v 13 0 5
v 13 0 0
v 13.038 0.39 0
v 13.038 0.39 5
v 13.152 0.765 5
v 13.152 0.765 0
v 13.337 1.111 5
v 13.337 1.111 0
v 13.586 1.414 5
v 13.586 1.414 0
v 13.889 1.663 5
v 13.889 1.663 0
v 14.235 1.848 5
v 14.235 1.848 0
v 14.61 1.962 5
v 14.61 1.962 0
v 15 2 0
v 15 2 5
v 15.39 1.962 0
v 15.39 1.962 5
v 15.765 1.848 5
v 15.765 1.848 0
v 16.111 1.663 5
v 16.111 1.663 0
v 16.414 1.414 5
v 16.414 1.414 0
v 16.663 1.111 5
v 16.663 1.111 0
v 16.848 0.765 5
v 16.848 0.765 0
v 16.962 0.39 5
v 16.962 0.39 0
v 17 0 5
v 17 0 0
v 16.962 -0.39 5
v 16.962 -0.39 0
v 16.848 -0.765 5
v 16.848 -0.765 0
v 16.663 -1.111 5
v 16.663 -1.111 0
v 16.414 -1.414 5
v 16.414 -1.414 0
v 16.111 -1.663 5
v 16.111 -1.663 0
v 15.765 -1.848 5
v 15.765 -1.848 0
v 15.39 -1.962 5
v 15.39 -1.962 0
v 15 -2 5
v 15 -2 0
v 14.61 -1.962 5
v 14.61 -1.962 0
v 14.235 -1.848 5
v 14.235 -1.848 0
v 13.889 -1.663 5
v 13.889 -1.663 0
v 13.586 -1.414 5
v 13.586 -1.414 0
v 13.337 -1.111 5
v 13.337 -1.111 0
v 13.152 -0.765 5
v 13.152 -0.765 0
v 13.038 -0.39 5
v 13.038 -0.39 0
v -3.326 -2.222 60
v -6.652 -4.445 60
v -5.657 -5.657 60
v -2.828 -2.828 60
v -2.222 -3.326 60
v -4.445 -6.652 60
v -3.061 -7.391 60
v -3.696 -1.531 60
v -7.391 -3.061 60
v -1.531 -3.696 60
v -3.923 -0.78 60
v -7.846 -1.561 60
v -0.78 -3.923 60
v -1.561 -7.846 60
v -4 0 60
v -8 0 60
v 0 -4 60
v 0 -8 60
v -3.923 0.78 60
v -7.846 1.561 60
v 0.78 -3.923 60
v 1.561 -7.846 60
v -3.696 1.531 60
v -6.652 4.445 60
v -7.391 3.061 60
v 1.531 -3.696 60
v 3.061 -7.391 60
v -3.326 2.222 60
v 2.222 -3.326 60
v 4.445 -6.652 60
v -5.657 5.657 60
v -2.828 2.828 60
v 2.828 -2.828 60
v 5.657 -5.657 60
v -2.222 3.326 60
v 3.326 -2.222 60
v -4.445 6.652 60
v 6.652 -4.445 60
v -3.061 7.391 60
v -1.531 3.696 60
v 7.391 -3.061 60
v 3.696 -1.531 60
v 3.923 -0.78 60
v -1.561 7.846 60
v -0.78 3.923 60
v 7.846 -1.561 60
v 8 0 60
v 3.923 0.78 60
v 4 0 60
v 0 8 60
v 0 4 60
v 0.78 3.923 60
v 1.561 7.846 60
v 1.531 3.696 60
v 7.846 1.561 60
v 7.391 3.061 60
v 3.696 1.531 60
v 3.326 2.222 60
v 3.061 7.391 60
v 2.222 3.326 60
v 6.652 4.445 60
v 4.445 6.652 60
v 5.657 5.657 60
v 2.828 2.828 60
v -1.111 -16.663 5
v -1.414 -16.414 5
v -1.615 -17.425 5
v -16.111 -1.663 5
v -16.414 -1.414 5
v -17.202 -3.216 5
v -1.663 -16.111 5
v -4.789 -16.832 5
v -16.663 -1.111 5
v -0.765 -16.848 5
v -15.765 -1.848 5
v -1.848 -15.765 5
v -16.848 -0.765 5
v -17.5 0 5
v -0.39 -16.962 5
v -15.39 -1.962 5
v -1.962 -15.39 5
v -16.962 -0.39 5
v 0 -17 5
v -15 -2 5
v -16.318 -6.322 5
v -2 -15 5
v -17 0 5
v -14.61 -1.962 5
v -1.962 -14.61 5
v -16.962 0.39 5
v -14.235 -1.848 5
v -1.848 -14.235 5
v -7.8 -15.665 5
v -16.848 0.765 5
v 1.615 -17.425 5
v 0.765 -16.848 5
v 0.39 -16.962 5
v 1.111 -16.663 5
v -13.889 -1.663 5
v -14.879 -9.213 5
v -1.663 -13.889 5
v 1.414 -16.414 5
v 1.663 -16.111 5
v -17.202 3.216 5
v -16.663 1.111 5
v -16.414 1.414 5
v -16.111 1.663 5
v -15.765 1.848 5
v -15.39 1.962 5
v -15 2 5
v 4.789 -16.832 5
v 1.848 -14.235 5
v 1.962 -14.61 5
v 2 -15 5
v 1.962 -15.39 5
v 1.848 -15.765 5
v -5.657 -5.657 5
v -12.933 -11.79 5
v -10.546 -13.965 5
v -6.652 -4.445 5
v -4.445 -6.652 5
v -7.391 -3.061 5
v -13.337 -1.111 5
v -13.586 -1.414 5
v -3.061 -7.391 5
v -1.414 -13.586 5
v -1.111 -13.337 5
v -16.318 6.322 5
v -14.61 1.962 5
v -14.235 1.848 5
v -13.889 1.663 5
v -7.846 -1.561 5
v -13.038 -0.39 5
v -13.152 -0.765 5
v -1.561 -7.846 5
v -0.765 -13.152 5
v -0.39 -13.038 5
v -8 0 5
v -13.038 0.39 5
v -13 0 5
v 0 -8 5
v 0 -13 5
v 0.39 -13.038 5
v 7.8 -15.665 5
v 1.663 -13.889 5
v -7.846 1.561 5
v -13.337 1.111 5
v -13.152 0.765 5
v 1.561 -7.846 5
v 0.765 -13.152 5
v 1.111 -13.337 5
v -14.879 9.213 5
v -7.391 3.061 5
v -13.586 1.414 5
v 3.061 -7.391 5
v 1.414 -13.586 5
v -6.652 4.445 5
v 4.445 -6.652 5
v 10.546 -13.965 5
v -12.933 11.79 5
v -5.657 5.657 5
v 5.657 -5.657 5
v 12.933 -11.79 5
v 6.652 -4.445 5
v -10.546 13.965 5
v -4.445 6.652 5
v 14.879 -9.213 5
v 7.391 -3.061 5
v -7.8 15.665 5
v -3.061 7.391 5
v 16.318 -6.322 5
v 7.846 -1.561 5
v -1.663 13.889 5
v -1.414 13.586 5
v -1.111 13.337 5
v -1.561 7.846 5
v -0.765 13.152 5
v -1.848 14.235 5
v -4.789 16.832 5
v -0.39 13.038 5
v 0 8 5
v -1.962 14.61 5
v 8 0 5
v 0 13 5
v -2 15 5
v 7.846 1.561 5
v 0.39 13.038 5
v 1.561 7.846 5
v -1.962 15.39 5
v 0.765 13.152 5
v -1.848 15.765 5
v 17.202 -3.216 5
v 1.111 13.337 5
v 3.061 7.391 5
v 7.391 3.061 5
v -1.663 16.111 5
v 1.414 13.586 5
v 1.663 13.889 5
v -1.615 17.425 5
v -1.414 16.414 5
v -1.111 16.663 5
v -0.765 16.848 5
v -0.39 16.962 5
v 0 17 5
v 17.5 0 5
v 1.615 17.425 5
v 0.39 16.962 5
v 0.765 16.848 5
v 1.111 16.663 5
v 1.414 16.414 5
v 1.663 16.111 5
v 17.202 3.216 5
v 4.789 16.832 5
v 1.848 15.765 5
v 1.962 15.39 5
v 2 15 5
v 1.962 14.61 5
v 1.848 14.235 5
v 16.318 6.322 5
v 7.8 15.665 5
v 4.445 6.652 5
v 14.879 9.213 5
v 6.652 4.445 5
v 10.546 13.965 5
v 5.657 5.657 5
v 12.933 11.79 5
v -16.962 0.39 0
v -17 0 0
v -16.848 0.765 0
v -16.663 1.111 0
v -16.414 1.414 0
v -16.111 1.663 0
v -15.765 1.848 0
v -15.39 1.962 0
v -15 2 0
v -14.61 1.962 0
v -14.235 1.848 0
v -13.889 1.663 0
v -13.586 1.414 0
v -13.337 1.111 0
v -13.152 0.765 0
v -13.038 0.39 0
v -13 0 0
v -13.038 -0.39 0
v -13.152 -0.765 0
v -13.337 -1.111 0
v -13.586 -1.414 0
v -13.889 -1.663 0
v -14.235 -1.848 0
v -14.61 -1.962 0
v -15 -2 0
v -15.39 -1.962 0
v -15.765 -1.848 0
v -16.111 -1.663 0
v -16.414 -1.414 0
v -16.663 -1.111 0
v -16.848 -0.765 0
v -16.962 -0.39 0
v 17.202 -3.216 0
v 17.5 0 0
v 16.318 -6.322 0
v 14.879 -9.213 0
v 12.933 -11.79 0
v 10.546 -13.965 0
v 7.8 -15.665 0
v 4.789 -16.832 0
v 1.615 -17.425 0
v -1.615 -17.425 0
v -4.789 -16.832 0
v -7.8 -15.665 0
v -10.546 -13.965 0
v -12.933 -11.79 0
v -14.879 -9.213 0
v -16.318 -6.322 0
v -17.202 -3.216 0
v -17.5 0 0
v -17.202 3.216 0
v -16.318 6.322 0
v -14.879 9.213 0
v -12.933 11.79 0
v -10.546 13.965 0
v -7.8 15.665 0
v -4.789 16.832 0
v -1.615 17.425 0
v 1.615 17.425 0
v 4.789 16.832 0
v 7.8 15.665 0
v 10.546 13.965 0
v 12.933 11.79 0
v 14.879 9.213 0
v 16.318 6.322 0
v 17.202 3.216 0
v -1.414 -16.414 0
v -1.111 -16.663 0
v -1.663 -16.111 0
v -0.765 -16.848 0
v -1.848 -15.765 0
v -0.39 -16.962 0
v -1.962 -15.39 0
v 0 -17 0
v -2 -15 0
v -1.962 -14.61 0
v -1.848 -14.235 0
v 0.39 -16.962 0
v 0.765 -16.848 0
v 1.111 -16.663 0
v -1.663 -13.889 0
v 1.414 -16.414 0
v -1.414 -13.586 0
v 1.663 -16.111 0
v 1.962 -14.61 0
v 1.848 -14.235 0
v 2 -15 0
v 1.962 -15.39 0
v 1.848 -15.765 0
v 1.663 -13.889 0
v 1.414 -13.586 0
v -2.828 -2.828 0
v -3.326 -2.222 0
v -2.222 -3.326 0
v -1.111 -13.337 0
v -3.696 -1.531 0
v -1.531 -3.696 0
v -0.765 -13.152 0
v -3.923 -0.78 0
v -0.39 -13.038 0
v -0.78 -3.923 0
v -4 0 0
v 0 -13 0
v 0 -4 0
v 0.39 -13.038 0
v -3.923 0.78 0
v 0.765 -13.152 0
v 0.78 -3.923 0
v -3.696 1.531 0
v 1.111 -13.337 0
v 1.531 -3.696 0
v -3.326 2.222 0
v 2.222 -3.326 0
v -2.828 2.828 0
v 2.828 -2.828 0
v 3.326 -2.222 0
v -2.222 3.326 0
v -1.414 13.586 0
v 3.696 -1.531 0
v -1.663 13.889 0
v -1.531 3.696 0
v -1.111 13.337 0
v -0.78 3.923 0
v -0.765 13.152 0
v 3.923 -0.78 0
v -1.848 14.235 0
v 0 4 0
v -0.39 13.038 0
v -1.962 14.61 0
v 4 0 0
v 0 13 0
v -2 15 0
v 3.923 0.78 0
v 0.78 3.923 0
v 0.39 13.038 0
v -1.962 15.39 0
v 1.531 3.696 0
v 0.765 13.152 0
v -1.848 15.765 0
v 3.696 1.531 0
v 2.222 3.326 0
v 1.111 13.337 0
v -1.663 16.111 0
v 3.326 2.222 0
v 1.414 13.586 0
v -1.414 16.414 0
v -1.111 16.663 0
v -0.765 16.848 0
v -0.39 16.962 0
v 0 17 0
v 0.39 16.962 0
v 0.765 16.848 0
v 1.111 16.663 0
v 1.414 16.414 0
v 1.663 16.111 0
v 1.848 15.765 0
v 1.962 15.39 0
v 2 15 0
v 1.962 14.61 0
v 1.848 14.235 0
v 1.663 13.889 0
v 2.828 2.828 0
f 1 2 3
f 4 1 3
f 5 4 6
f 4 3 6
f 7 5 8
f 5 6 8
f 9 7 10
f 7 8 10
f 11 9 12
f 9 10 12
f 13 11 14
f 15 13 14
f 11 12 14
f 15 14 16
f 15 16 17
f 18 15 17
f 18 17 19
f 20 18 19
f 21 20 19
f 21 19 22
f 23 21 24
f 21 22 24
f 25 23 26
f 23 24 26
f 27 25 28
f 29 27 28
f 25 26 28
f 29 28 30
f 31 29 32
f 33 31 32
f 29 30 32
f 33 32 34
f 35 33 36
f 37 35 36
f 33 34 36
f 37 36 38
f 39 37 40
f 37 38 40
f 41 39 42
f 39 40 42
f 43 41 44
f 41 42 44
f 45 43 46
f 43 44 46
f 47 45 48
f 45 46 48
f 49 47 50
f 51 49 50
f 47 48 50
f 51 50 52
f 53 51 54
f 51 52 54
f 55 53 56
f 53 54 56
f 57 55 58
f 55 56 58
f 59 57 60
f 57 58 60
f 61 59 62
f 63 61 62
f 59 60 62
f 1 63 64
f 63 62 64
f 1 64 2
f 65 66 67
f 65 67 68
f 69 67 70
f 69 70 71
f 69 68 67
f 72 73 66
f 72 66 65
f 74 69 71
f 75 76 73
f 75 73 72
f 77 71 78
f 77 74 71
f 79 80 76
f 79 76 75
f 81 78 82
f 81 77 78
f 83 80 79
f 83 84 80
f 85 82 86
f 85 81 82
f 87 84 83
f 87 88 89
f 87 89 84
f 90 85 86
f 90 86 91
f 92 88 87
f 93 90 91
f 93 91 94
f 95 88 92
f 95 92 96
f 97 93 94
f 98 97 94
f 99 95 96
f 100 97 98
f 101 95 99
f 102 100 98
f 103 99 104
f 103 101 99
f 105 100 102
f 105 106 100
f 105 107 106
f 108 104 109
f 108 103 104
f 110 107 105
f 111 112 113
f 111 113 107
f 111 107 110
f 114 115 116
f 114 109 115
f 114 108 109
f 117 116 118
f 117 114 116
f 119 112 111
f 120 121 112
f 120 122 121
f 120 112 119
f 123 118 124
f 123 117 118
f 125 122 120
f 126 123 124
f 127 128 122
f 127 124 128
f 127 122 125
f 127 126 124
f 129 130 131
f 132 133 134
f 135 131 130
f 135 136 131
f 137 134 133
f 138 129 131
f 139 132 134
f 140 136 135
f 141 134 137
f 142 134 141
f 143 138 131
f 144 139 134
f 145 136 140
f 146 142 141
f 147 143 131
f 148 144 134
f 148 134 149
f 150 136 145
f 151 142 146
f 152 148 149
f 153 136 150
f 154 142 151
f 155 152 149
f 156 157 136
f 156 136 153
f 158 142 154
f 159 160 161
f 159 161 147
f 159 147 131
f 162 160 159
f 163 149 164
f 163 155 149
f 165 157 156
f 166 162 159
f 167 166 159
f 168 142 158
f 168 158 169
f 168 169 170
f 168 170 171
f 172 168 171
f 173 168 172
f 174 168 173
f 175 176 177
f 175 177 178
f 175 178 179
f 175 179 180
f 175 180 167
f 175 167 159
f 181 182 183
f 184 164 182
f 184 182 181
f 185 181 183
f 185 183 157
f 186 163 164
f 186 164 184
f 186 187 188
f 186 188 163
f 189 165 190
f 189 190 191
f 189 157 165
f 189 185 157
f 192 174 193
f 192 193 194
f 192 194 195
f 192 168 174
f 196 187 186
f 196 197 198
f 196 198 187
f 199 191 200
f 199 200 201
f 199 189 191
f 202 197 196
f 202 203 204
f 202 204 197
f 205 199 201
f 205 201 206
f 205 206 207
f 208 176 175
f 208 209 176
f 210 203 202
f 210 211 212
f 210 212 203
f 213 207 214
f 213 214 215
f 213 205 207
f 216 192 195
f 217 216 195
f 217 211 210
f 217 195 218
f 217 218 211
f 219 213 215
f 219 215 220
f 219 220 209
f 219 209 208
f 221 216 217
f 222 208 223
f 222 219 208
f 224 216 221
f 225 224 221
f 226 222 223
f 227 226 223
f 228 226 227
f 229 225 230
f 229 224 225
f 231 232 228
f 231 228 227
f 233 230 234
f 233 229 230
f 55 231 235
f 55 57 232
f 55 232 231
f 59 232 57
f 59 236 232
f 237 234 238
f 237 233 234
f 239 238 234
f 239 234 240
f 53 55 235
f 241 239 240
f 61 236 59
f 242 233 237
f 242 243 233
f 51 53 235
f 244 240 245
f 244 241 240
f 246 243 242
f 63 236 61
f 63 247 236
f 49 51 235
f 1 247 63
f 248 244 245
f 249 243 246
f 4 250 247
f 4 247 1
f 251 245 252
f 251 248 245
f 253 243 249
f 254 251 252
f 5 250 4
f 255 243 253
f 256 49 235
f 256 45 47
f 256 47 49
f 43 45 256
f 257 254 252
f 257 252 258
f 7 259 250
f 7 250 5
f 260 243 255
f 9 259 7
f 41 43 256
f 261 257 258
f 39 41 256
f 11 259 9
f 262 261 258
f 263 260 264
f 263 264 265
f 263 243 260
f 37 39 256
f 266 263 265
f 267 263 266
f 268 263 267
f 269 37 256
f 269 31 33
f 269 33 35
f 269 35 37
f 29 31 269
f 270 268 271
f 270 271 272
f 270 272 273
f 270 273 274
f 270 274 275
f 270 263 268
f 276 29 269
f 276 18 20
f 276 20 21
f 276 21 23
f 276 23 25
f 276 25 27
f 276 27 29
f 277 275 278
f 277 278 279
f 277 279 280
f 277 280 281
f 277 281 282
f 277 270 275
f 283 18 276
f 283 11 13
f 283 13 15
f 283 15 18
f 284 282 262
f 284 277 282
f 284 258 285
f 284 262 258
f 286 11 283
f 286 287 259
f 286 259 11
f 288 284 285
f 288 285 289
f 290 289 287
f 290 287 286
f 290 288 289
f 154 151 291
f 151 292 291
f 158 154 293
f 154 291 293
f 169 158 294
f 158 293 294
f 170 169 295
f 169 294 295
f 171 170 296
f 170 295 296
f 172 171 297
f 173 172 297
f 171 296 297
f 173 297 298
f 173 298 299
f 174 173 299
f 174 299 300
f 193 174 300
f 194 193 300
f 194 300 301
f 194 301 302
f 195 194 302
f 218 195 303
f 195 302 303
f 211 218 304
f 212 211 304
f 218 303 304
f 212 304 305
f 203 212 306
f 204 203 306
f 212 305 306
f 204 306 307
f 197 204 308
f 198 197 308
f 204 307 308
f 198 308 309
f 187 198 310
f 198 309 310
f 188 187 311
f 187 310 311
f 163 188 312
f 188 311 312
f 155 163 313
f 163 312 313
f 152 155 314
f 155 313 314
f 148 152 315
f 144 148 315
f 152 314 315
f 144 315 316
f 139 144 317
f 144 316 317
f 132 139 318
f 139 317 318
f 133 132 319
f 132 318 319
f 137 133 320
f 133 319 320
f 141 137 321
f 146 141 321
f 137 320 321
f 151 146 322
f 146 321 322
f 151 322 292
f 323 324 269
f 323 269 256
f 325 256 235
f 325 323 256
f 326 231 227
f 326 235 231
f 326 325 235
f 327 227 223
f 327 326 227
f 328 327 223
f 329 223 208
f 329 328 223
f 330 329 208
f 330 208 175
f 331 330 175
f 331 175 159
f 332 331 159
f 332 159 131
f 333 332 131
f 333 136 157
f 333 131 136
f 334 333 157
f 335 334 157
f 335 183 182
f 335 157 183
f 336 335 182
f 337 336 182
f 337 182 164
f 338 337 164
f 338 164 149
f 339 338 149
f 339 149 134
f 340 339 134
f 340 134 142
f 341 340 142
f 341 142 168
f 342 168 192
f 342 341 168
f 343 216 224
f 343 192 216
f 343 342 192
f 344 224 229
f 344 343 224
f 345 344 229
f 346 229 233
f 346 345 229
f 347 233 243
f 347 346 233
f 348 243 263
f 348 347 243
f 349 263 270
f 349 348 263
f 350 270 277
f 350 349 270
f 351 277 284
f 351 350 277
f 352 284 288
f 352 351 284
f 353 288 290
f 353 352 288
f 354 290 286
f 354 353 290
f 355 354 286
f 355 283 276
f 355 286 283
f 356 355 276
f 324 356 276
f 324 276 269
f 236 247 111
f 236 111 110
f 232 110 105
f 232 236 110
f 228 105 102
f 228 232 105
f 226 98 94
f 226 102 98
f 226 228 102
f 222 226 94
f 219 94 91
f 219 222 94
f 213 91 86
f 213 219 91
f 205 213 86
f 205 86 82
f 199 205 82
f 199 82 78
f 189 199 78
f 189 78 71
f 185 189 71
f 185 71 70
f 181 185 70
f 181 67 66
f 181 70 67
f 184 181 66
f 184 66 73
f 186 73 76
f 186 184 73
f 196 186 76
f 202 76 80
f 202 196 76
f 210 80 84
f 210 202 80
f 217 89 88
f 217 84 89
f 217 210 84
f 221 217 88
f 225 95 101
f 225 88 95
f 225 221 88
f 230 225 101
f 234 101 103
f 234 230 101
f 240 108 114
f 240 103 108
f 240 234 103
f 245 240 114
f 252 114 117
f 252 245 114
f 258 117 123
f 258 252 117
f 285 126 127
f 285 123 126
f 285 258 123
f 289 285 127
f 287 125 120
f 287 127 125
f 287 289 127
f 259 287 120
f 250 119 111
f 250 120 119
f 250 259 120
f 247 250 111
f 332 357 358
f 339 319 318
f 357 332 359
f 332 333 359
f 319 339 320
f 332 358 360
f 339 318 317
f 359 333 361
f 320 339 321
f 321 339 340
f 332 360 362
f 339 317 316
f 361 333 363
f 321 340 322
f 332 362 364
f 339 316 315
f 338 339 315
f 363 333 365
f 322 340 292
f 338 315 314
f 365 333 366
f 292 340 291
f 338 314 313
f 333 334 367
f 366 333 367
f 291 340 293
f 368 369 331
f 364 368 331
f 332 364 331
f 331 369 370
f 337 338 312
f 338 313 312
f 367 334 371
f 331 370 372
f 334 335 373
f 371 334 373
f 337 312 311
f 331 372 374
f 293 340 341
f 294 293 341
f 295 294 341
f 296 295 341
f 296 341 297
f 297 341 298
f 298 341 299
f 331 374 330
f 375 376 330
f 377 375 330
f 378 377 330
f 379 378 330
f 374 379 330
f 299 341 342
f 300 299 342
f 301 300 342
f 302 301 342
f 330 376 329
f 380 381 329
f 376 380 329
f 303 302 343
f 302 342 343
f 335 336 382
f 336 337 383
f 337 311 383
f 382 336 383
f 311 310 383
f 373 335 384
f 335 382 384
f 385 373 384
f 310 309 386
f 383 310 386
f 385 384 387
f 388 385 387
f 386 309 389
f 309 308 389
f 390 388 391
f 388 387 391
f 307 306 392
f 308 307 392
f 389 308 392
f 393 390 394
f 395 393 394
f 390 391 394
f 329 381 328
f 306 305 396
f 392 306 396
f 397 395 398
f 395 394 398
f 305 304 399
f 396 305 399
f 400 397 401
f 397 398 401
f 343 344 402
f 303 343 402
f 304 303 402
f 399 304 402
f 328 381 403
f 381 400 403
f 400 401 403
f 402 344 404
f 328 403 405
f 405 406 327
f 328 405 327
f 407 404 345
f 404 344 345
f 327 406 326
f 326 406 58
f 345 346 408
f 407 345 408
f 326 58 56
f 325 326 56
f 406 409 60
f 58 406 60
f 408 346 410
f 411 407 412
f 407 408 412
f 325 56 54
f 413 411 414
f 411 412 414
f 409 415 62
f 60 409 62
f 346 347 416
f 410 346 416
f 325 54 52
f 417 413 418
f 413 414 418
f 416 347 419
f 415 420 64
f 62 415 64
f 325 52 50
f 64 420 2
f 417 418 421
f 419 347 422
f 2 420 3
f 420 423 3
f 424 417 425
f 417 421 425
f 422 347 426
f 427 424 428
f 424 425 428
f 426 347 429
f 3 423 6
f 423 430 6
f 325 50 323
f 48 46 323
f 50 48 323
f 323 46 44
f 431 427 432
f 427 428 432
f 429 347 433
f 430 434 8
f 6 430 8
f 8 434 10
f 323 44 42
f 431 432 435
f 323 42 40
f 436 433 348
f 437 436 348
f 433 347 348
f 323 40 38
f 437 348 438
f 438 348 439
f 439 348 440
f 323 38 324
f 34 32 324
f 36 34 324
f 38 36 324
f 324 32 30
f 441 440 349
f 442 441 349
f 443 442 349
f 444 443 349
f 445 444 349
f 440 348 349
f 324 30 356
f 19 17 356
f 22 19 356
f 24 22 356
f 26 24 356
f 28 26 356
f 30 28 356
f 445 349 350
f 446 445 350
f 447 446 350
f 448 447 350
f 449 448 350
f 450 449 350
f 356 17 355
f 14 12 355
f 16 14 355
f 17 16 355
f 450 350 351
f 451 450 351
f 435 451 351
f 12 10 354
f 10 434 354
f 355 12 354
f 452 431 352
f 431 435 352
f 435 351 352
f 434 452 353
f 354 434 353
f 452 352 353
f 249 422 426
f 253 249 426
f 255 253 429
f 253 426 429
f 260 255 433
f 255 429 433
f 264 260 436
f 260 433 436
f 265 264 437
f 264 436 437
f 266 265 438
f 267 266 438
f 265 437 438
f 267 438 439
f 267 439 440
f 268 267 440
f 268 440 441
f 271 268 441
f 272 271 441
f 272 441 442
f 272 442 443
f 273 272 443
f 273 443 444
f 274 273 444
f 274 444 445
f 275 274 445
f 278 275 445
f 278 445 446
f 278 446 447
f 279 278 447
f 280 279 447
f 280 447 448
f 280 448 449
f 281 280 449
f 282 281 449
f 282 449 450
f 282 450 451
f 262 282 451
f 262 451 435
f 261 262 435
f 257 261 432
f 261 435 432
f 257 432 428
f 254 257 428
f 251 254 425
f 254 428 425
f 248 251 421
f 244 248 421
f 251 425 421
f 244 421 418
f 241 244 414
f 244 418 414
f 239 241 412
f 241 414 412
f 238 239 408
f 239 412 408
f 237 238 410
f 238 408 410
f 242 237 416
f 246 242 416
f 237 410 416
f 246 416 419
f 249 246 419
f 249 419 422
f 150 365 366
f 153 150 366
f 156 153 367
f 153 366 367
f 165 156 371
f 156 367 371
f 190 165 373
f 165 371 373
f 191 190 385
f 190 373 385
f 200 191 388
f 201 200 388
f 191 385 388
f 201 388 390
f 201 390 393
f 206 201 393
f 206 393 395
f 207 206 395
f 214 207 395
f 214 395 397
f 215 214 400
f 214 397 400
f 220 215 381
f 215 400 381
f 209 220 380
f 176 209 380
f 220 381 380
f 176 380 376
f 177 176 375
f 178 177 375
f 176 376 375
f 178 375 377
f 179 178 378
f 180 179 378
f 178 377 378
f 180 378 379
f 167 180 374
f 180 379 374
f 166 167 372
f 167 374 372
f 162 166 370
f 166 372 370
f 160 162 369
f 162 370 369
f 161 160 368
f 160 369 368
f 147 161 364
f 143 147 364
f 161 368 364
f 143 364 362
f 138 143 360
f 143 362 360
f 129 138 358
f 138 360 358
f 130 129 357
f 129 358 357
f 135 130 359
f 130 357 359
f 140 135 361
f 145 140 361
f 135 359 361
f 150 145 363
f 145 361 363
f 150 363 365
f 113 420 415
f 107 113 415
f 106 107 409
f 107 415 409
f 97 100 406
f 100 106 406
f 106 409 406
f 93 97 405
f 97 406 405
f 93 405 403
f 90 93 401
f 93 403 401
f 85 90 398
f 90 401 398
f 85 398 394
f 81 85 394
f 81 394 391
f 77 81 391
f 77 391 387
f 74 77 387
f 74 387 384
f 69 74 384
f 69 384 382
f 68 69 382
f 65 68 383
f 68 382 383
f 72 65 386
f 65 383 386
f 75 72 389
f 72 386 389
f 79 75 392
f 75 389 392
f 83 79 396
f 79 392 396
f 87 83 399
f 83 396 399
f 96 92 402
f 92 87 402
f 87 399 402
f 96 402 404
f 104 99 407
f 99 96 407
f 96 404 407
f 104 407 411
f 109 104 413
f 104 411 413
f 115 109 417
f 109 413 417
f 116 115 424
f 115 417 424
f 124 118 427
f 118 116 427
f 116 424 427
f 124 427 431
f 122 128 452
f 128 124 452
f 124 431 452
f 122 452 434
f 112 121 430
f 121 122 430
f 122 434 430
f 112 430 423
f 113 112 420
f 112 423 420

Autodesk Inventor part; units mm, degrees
ref_plane "YZ Plane" through (0, 0, 0) normal (1, 0, 0) x (0, 1, 0)
ref_plane "XZ Plane" through (0, 0, 0) normal (0, 1, 0) x (-1, 0, 0)
ref_plane "XY Plane" through (0, 0, 0) normal (0, 0, 1) x (1, 0, 0)
sketch "Sketch3" plane through (0, 0, 0) normal (0, 0, 1) x (1, 0, 0)
  circle A0 centre (0, 0) radius 4
  circle A1 centre (0, 0) radius 17.5
  dimension "d0" = 8
  dimension "d1" = 35
extrude "Extrusion1" add sketch "Sketch3" along normal blind 5
sketch "Sketch4" plane through (0, 0, 5) normal (0, 0, 1) x (1, 0, 0)
  circle A0 centre (0, 0) radius 4
  circle A1 centre (0, 0) radius 8
  dimension "d4" = 16
  dimension "d5" = 8
extrude "Extrusion2" add sketch "Sketch4" along normal blind 55
sketch "Sketch5" plane through (0, 0, 0) normal (0, 0, -1) x (-1, 0, 0)
  circle A0 centre (15, 0) radius 2
  circle A1 centre (0, 15) radius 2
  circle A2 centre (0, -15) radius 2
  circle A3 centre (-15, 0) radius 2
  point P0 (0, 0)
  dimension "d8" = 4
  dimension "d9" = 15
  dimension "d10" = 15
  dimension "d11" = 15
  dimension "d12" = 15
  dimension "d13" = 4
  dimension "d14" = 4
  dimension "d15" = 4
extrude "Extrusion3" cut sketch "Sketch5" against normal through all
equation "\"d0\" = RodDiameter"
equation "\"d4\" = VerticalBearingOD"
equation "\"d5\" = RodDiameter"
equation "\"d9\" = 0.5 * VerticalBearingMountingHoleDiameter"
equation "\"d10\" = 0.5 * VerticalBearingMountingHoleDiameter"
equation "\"d11\" = 0.5 * VerticalBearingMountingHoleDiameter"
equation "\"d12\" = 0.5 * VerticalBearingMountingHoleDiameter"
equation "\"d13\" = d8"
equation "\"d14\" = d8"
equation "\"d15\" = d8"
equation "\"RodDiameter\" = 8"
equation "\"VerticalBearingOD\" = 16"
equation "\"PrintingClearance\" = 0.2"
equation "\"VerticalBearingMountingHoleDiameter\" = 30"
properties part number "VerticalBearing"
